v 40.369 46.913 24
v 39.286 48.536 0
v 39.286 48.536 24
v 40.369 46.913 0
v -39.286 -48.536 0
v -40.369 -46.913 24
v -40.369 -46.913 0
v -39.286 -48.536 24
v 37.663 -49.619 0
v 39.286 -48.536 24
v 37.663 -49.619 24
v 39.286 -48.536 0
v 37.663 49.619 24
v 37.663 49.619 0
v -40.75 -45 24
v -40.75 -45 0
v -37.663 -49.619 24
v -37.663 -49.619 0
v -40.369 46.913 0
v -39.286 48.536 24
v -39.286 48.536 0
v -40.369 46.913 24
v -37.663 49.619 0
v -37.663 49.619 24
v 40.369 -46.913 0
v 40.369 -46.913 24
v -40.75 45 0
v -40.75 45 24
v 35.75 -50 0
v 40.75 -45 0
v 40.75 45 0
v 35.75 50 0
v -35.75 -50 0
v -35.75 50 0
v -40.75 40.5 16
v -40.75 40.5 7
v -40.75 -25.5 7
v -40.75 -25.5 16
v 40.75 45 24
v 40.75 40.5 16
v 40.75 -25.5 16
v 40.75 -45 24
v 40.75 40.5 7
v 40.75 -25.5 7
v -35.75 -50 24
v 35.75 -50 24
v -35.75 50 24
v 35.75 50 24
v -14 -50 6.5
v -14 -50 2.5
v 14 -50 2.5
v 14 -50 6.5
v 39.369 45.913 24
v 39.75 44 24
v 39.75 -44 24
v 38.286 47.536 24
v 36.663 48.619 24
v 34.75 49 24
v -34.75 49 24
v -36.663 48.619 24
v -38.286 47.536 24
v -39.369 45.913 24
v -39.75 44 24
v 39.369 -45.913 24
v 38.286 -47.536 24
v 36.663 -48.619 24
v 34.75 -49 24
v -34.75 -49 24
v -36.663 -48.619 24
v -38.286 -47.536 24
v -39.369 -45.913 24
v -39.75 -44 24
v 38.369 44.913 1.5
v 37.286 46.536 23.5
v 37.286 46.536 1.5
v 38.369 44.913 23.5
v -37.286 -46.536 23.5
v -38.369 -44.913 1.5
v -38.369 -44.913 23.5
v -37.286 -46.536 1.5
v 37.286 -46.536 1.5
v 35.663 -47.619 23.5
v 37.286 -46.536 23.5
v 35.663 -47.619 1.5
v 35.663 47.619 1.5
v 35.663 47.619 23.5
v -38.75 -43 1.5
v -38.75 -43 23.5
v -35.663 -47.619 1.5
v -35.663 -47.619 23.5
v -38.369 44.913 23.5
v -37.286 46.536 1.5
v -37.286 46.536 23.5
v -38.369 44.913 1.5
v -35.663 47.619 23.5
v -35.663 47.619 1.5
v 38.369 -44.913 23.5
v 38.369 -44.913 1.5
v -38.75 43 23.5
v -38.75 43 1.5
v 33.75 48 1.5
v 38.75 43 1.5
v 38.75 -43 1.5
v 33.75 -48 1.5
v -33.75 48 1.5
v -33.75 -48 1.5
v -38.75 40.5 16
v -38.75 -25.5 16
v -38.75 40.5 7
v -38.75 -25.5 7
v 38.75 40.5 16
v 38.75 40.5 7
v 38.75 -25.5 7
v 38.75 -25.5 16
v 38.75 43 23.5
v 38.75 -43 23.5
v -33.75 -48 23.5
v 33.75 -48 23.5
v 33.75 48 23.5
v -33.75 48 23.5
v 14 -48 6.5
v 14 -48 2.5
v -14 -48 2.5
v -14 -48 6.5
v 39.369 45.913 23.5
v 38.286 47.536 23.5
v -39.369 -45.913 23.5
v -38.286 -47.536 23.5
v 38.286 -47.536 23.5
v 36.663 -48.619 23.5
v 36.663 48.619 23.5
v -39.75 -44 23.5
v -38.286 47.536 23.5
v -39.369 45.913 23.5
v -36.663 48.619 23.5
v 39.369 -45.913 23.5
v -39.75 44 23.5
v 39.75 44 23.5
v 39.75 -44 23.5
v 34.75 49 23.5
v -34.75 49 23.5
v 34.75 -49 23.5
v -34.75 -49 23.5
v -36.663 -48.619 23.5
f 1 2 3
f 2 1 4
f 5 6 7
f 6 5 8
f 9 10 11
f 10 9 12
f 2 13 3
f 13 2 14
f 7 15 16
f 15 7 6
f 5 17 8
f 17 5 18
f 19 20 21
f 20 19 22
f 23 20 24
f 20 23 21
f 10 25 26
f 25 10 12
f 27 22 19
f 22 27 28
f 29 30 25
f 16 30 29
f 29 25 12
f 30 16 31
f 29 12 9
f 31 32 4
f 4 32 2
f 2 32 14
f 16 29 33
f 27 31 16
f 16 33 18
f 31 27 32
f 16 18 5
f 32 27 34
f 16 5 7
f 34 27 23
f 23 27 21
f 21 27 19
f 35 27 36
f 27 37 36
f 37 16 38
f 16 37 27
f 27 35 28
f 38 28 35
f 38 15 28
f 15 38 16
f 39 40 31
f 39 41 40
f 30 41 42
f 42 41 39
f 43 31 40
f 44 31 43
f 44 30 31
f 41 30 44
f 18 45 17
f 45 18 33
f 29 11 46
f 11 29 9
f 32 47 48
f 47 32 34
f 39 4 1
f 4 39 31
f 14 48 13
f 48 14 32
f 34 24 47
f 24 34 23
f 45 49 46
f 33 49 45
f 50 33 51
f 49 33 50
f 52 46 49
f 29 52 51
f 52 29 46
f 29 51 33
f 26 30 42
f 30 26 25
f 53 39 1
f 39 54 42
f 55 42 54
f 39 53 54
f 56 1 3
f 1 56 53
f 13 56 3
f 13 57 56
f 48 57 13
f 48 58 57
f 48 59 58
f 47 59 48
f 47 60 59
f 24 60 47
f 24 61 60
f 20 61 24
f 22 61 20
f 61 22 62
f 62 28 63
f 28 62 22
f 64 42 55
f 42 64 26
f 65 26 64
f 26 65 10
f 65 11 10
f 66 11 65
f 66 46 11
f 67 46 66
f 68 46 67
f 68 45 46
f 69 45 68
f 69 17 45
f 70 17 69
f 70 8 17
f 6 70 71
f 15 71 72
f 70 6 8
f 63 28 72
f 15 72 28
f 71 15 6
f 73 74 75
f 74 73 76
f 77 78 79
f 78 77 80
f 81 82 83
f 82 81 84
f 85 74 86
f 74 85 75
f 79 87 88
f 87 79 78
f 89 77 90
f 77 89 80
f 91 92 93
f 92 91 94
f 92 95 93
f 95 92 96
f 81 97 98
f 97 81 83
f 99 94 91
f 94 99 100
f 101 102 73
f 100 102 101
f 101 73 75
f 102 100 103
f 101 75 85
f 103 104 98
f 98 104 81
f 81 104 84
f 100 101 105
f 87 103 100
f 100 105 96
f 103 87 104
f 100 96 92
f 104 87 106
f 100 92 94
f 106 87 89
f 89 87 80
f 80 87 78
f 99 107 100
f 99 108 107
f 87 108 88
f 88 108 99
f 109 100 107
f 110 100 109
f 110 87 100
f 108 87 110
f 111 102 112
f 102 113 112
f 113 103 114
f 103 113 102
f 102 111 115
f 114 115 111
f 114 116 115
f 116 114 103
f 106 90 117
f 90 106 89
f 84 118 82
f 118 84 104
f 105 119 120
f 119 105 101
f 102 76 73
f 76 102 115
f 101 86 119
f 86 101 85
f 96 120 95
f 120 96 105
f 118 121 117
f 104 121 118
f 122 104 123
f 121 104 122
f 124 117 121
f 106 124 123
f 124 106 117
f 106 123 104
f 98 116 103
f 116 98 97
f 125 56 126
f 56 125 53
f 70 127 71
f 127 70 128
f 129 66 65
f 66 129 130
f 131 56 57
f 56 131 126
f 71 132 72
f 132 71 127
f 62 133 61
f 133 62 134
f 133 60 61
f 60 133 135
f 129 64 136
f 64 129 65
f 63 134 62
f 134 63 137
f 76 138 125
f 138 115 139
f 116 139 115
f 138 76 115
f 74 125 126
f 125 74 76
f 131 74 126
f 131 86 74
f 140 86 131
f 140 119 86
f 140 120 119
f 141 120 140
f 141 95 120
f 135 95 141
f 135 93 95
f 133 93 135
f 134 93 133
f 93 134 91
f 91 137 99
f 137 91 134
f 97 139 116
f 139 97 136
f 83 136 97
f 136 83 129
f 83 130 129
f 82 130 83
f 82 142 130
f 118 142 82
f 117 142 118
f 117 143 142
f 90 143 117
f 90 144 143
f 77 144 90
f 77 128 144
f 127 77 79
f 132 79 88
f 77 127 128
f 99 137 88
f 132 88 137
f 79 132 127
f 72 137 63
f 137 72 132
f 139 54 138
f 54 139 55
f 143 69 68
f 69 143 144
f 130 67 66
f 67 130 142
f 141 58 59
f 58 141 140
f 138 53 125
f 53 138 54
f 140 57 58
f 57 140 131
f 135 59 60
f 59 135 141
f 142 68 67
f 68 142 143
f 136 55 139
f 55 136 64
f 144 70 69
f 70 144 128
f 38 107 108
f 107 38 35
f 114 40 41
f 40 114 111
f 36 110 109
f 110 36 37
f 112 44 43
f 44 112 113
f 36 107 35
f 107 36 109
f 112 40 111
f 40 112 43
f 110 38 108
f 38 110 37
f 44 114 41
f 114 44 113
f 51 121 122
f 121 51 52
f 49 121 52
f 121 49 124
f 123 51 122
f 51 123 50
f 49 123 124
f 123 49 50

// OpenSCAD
//include <C__fakepath_roundedrect.scad>

/*
 * "8 channel relay case.scad"
 * 
 * Written by mattdurr @ Thingiverse
 *
 * This script is licensed under the Public Domain license.
 *
 *
 */


// because this case has rounded corners it has a different internal width and length to the object in it.
// but all we care about is the object in it, the rest is automatic

//all dimentions in mm

/* [Case] */

//Width of the object in the box
object_Width_text_box = 72.5;
//Length of the object in the box
object_Length_text_box = 91;
//Height of the object in the box, the box will match this
object_Height_text_box = 22.5;
//Depth of the floor layer
floor_Depth_text_box = 1.5;
//Width of the boxes shell
shell_Width_text_box = 2;
//The radius of the boxes corners
corner_Radius_text_box = 5;

//Ridge depth down the side of the case
ridge_Height_text_box = 0.5;
//Ridge depth into the shell
ridge_Depth_text_box = 1;

//Length of the screw terminal window
screw_Terminal_Window_Length_text_box = 66;
//Width of the screw terminal window
screw_Terminal_Window_Height_text_box = 9;
//Screw terminal window offset from bottom case wall
screw_Terminal_Window_Wall_Offset_text_box = 5;
//Screw terminal window offset from floor
screw_Terminal_Window_Floor_Offset_text_box = 10;


// I added an IO window for my board because I soldered a female header under the male IO
//Height of the IO window
io_Window_Height_text_box = 4;
//Width of the IO window
io_Window_Width_text_box = 28;
//Floor Offset of the IO window
io_Window_Offset_From_Floor_text_box = 3;

/* [Hidden] */

caseWidth = object_Width_text_box + (2 * shell_Width_text_box);
caseLength = object_Length_text_box + (2 * shell_Width_text_box);
caseHeight = object_Height_text_box + floor_Depth_text_box;


//visualize the object
//color("red") translate([0,0,(object_Height_text_box/2)+floor_Depth_text_box]) cube(size = [object_Width_text_box, object_Length_text_box, object_Height_text_box], center = true);

/* THE FOLLOWING SECTION WAS TAKEN FROM http://www.thingiverse.com/thing:9347 */
/* I AM EMBEDDING THIS HERE SO THAT I CAN USE THE CUSTOMIZER ON THINGIVERSE */

// You could simply do it this way if you have the boxes.scad
// file in your library
//use <boxes.scad>
//roundedBox([20, 30, 40], 5, true); 

// Or, you could do it this way if you want to roll your own
//roundedRect([20, 30, 40], 5, $fn=12);

// size - [x,y,z]
// radius - radius of corners
module roundedRect(size, radius)
{
	x = size[0];
	y = size[1];
	z = size[2];

	linear_extrude(height=z)
	hull()
	{
		// place 4 circles in the corners, with the given radius
		translate([(-x/2)+(radius/2), (-y/2)+(radius/2), 0])
		circle(r=radius);
	
		translate([(x/2)-(radius/2), (-y/2)+(radius/2), 0])
		circle(r=radius);
	
		translate([(-x/2)+(radius/2), (y/2)-(radius/2), 0])
		circle(r=radius);
	
		translate([(x/2)-(radius/2), (y/2)-(radius/2), 0])
		circle(r=radius);
	}
}

/* END OF BORROWED SECTION */

difference()
{
  //outer shell
  roundedRect([caseWidth, caseLength, caseHeight], corner_Radius_text_box, true);
  
  //inner volume
  translate([0,0,floor_Depth_text_box]) roundedRect([object_Width_text_box, object_Length_text_box, object_Height_text_box], corner_Radius_text_box, true);
  
  //ridge
  translate([0,0,caseHeight-ridge_Height_text_box]) roundedRect([caseWidth-(2*ridge_Depth_text_box), caseLength-(2*ridge_Depth_text_box), ridge_Height_text_box], corner_Radius_text_box, true);
  
  //ac connectors
  translate([0, ((object_Length_text_box/2)-(screw_Terminal_Window_Length_text_box/2))-screw_Terminal_Window_Wall_Offset_text_box, screw_Terminal_Window_Floor_Offset_text_box + floor_Depth_text_box]) cube(size = [caseWidth+(2*corner_Radius_text_box), screw_Terminal_Window_Length_text_box, screw_Terminal_Window_Height_text_box], center = true);
  
  //io connectors
  translate([0, -(object_Length_text_box/2)-(corner_Radius_text_box/2)-(shell_Width_text_box/2), io_Window_Offset_From_Floor_text_box+floor_Depth_text_box]) cube(size = [io_Window_Width_text_box, shell_Width_text_box, io_Window_Height_text_box], center = true);

}
